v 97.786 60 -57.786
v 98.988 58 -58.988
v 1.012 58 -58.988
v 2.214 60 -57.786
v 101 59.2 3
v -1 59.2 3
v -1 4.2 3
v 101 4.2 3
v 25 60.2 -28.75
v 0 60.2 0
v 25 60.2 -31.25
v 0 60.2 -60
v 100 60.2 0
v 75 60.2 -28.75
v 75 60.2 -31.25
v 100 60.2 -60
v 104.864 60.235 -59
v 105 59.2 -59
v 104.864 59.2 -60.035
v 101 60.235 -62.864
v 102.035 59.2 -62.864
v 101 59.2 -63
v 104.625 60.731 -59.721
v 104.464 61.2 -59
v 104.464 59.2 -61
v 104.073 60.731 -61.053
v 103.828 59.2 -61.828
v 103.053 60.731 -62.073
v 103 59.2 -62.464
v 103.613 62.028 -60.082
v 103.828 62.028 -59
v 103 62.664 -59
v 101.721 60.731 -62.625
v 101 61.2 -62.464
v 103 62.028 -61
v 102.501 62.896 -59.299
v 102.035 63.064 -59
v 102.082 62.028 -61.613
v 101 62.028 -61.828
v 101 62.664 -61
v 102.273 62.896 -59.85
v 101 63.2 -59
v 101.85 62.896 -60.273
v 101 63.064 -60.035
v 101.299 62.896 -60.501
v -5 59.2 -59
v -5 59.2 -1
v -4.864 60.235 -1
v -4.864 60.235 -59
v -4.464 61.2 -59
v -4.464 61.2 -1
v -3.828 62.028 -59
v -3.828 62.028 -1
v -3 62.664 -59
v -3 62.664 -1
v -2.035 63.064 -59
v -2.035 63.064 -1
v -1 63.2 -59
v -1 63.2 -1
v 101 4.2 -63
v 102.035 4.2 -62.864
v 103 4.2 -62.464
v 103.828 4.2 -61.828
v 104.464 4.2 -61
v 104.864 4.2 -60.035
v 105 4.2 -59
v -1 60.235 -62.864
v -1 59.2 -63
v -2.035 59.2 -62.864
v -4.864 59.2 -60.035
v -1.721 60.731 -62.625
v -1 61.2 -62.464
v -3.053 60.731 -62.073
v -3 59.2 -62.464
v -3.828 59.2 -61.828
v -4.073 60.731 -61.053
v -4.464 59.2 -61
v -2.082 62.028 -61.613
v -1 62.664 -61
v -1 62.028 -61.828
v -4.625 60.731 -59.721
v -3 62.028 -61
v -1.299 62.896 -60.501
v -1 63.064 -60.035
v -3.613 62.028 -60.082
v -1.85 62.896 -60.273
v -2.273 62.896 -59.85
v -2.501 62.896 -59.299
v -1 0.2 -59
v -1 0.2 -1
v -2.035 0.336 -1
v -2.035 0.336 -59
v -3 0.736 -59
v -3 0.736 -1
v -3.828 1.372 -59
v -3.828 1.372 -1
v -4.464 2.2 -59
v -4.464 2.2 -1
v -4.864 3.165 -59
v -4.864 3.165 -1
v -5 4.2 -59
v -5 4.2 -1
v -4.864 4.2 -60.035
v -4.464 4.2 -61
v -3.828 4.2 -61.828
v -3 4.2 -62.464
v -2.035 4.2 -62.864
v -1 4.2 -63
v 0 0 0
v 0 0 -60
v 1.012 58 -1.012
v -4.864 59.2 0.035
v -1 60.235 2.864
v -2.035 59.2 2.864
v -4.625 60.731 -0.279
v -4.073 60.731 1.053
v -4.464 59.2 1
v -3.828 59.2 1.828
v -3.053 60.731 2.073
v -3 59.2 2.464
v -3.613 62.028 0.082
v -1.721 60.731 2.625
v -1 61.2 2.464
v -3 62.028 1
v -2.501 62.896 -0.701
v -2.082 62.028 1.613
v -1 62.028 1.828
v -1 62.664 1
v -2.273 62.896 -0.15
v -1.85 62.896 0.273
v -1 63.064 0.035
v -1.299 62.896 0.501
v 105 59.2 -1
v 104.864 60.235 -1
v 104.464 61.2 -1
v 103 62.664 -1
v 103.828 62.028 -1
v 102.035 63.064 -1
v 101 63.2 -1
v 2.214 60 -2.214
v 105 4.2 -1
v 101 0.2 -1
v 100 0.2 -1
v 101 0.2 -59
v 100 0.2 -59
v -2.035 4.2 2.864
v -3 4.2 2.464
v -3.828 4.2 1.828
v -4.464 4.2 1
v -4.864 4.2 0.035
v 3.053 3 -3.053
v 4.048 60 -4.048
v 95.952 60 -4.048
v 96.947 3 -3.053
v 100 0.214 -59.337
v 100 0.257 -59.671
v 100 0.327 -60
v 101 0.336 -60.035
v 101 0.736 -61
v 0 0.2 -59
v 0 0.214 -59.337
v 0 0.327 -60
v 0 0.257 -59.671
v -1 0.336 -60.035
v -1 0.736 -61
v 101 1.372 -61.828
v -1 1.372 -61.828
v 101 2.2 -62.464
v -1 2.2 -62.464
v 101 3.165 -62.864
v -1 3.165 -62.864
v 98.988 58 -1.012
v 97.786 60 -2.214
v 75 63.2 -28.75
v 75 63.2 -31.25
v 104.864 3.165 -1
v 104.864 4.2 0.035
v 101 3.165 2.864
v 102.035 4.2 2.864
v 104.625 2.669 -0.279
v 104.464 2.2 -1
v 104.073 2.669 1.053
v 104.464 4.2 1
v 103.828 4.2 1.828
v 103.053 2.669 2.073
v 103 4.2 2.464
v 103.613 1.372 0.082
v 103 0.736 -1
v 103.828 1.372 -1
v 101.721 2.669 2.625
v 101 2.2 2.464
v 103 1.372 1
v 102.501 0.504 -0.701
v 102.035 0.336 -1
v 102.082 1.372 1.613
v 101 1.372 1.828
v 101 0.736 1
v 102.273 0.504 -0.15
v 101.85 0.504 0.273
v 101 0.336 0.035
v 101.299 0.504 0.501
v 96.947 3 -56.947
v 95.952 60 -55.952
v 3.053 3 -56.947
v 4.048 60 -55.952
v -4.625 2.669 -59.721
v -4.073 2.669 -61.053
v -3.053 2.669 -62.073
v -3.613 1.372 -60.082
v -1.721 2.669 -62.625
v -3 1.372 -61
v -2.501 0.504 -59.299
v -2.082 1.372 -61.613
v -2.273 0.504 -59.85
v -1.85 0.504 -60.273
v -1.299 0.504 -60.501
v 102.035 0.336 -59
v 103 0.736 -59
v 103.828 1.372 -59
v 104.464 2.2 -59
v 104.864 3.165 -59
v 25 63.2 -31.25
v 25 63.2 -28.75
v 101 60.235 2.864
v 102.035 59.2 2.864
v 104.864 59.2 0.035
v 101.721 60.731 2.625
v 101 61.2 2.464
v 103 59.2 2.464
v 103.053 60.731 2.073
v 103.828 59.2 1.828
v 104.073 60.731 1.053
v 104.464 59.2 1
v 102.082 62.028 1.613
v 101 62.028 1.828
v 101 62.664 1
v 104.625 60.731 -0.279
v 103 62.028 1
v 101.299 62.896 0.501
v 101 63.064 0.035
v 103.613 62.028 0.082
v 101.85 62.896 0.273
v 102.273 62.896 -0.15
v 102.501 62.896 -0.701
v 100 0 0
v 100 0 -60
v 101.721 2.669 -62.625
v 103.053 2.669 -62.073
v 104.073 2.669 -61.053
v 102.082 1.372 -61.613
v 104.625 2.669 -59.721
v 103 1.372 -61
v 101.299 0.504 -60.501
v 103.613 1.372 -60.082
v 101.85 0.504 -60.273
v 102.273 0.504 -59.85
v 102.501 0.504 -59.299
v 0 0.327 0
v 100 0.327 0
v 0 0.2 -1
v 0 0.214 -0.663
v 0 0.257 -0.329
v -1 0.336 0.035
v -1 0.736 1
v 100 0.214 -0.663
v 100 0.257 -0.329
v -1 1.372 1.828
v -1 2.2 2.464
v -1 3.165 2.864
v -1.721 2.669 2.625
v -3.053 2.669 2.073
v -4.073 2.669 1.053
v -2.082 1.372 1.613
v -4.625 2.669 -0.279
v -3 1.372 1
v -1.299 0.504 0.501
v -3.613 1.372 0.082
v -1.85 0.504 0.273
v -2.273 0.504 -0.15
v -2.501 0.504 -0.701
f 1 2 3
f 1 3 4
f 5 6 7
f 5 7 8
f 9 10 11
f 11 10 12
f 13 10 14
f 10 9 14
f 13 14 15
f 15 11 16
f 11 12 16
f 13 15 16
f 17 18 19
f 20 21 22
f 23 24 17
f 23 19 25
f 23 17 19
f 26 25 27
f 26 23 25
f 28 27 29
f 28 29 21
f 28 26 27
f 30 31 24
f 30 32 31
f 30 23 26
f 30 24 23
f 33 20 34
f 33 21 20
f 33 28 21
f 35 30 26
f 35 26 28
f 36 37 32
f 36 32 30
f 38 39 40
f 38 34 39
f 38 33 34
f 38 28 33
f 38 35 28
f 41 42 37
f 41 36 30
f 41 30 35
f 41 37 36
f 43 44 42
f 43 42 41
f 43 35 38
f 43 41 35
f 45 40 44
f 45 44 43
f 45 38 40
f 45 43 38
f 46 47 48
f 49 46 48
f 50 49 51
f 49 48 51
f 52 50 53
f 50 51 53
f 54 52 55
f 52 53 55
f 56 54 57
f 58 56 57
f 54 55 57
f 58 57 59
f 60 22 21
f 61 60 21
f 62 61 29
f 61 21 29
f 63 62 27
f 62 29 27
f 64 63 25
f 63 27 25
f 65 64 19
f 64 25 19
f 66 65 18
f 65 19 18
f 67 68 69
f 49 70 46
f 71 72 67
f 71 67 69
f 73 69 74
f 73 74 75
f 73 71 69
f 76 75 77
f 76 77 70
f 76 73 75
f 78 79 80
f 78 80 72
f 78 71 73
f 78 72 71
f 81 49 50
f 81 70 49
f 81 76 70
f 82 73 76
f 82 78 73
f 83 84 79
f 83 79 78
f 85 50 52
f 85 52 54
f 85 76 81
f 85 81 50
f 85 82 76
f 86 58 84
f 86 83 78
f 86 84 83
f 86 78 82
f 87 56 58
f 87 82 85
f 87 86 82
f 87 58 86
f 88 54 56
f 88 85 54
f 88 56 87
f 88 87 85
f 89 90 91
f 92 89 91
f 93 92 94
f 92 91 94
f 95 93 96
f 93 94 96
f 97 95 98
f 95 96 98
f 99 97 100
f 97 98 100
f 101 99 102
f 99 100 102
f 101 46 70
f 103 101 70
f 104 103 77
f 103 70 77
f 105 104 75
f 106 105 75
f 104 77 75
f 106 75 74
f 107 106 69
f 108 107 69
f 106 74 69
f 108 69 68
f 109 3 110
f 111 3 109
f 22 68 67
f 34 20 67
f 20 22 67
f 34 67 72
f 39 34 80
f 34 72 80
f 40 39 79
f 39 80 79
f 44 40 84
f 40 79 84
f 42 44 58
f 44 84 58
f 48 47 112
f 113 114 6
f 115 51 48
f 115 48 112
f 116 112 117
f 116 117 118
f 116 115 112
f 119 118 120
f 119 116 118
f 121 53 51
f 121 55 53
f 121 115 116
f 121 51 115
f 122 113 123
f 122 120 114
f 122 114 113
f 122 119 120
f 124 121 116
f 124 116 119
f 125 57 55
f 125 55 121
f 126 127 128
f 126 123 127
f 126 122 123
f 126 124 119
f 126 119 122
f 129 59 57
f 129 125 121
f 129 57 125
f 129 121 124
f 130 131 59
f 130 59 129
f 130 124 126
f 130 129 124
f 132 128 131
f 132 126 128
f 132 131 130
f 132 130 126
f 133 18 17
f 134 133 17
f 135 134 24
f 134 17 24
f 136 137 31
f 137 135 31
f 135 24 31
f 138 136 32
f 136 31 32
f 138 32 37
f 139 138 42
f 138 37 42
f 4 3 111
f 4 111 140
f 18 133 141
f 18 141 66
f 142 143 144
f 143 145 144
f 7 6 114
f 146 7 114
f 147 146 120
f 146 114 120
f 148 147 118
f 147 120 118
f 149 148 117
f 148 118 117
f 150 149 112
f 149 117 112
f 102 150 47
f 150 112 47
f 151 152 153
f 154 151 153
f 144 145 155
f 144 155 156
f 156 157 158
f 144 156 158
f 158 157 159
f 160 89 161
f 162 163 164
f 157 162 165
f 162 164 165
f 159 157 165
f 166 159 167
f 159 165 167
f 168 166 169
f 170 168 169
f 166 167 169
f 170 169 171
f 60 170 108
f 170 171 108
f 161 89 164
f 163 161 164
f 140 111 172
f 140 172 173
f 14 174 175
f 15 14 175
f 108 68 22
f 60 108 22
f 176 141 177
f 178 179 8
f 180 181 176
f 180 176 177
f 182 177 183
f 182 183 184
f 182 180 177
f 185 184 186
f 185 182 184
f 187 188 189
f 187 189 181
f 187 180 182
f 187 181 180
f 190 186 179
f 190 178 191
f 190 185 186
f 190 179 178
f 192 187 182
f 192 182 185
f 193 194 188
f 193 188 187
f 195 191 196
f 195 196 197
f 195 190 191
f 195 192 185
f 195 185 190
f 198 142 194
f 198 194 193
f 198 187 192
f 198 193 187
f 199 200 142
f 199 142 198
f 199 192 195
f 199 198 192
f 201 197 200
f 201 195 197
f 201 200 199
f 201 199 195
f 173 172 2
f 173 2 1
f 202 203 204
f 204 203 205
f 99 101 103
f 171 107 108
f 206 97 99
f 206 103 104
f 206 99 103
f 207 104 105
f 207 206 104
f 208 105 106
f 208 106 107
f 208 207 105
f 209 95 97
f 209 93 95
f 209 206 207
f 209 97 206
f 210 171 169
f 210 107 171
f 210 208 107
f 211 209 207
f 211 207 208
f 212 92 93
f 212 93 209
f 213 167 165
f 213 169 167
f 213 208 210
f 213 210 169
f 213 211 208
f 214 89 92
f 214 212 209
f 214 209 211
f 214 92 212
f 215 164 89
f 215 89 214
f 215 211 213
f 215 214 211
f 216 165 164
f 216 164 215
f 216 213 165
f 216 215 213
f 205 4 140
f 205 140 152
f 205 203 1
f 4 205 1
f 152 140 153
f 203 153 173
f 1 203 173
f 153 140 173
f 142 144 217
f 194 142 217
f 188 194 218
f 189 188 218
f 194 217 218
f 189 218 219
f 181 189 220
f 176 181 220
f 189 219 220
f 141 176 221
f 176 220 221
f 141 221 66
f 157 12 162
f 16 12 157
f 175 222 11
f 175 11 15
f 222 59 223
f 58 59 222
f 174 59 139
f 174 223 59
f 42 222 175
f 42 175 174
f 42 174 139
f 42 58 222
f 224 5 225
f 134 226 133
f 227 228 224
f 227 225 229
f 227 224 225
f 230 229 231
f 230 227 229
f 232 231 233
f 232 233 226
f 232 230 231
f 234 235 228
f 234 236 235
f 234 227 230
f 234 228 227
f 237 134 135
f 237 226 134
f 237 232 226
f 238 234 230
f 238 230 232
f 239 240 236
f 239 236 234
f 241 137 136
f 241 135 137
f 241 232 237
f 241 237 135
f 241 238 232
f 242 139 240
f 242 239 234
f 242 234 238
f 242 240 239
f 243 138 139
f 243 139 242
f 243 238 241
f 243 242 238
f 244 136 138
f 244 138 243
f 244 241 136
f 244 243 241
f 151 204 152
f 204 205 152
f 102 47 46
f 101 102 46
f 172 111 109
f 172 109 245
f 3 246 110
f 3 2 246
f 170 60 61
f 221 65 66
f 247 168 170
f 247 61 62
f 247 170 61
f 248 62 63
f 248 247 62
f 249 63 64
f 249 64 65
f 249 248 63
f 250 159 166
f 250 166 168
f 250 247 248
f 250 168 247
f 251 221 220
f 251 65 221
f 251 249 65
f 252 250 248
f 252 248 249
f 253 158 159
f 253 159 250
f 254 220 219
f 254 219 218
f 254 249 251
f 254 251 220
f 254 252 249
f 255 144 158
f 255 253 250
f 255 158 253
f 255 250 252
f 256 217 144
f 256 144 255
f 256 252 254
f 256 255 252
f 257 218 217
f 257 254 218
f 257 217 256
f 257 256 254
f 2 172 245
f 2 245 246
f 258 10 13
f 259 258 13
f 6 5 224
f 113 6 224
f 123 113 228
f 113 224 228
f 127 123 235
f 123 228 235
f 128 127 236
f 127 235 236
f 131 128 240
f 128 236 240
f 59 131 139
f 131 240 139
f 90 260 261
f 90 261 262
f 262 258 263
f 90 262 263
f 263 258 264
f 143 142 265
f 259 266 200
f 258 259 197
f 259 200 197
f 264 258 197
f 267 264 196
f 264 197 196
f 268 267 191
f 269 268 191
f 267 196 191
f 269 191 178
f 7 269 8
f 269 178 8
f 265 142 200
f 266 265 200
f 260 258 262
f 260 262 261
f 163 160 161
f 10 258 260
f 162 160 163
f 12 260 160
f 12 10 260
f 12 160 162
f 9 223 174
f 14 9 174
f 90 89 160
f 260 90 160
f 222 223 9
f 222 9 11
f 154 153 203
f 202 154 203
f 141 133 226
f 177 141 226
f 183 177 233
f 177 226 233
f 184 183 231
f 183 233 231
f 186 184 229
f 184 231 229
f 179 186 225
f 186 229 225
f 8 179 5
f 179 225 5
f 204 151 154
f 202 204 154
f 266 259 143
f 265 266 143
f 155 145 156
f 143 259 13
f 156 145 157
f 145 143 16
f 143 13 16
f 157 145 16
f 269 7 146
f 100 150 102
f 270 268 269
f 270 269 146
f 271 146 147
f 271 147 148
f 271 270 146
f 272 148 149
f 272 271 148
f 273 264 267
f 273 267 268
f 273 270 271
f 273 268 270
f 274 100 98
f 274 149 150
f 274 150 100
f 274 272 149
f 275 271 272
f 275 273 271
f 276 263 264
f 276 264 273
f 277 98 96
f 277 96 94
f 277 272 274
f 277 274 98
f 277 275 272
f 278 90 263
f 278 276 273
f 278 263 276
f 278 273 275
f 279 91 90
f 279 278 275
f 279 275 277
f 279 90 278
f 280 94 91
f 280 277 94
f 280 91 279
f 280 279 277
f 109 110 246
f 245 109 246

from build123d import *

# Parameters (mm, degrees)
SKETCH1_W           = 100
SKETCH1_H           = 60
BOSS_EXTRUDE1_DEPTH = 60
BOSS_EXTRUDE1_TAPER = 1
SHELL1_T            = -3
CHAMFER1_SIZE       = 2
CHAMFER1_SIZE_2     = 1.166633397
SKETCH2_W           = 100
SKETCH2_H           = 60
BOSS_EXTRUDE2_DEPTH = 3
SKETCH3_W           = 110
SKETCH3_H           = 66
SKETCH3_W_2         = 100
SKETCH3_H_2         = 60
BOSS_EXTRUDE3_DEPTH = 63
SKETCH4_W           = 50
SKETCH4_H           = 2.5
CUT_EXTRUDE1_DEPTH  = 3
FILLET1_R           = 4


with BuildPart() as part:
    # Sketch1 → Boss-Extrude1 (new body)
    with BuildSketch(Plane(origin=(0, 0, 0), x_dir=(1, 0, 0), z_dir=(0, 1, 0))):
        with Locations((50, 30)):
            Rectangle(SKETCH1_W, SKETCH1_H)
    extrude(amount=BOSS_EXTRUDE1_DEPTH, taper=BOSS_EXTRUDE1_TAPER)

    # Shell1
    shell1_openings = [part.faces().sort_by_distance(p)[0] for p in [
        (50, 60, -30),
    ]]
    offset(amount=SHELL1_T, openings=shell1_openings, kind=Kind.INTERSECTION)

    # Chamfer1
    # the kernel refuses this chamfer: 2, 1.166633397 mm, written as the material it takes off along each edge
    with BuildSketch(Plane(origin=(98.952696104, 60, 4.126867614), x_dir=(0.03677296874035604, -0.9993236456574119, 0), z_dir=(0, 0, -1)), Plane(origin=(1.047303896, 60, -64.126867614), x_dir=(-0.036772968740354815, -0.9993236456574122, 0), z_dir=(0, 0, 1))) as chamfer1_piece_1:
        Polygon((CHAMFER1_SIZE * 0.999813220622, CHAMFER1_SIZE * 0.0193267656127), (-CHAMFER1_SIZE_2 * 0.0367729687471, CHAMFER1_SIZE_2 * 0.999323645842), (0, 0), align=None)
    extrude(amount=68.253735227, mode=Mode.SUBTRACT)
    with BuildSketch(Plane(origin=(104.126867614, 60, -58.952696104), x_dir=(0, -0.9993236456574122, -0.036772968740352616), z_dir=(-1, 0, 0)), Plane(origin=(-4.126867614, 60, -1.047303896), x_dir=(0, -0.9993236456574119, 0.03677296874035481), z_dir=(1, 0, 0))) as chamfer1_piece_2:
        Polygon((CHAMFER1_SIZE * 0.999813220622, CHAMFER1_SIZE * 0.0193267656127), (-CHAMFER1_SIZE_2 * 0.0367729687471, CHAMFER1_SIZE_2 * 0.999323645842), (0, 0), align=None)
    extrude(amount=108.253735227, mode=Mode.SUBTRACT)


with BuildPart() as body_2:
    # Sketch2 → Boss-Extrude2 (new body)
    with BuildSketch(Plane(origin=(0, 60.2, 0), x_dir=(1, 0, 0), z_dir=(0, 1, 0))):
        with Locations((50, 30)):
            Rectangle(SKETCH2_W, SKETCH2_H)
    extrude(amount=BOSS_EXTRUDE2_DEPTH)


with BuildPart() as body_3:
    # Sketch3 → Boss-Extrude3 (new body)
    with BuildSketch(Plane(origin=(0, 63.2, 0), x_dir=(1, 0, 0), z_dir=(0, 1, 0))):
        with Locations((50, 30)):
            Rectangle(SKETCH3_W, SKETCH3_H)
        with Locations((50, 30)):
            Rectangle(SKETCH3_W_2, SKETCH3_H_2, mode=Mode.SUBTRACT)
    extrude(amount=-BOSS_EXTRUDE3_DEPTH)


with BuildPart() as body_2_1:
    add(body_2.part)

    # Combine1: union body 3
    add(body_3.part)

    # Sketch4 → Cut-Extrude1 (cut)
    with BuildSketch(Plane(origin=(0, 63.2, 0), x_dir=(1, 0, 0), z_dir=(0, 1, 0))):
        with Locations((50, 30)):
            Rectangle(SKETCH4_W, SKETCH4_H)
    extrude(amount=-CUT_EXTRUDE1_DEPTH, mode=Mode.SUBTRACT)

    # Fillet1
    # the kernel refuses this fillet: 4 mm, written as the material it takes off along each edge
    with BuildSketch(Plane(origin=(101, 4.2, -59), x_dir=(0, 0, -1), z_dir=(0, -1, 0))) as fillet1_piece_1_section:
        Polygon((0, 0), (FILLET1_R, 0), (FILLET1_R, FILLET1_R), (0, FILLET1_R), align=None)
    fillet1_piece_1 = extrude(amount=FILLET1_R, mode=Mode.PRIVATE)
    fillet1_piece_1 = fillet1_piece_1 - Plane(origin=(101, 4.2, -59), x_dir=(-0.7071067811865475, 0, 0.7071067811865475), z_dir=(0, -1, 0)) * Sphere(FILLET1_R, mode=Mode.PRIVATE)
    add(fillet1_piece_1, mode=Mode.SUBTRACT)
    with BuildSketch(Plane(origin=(101, 4.2, -1), x_dir=(1, 0, 0), z_dir=(0, -1, 0))) as fillet1_piece_2_section:
        Polygon((0, 0), (FILLET1_R, 0), (FILLET1_R, FILLET1_R), (0, FILLET1_R), align=None)
    fillet1_piece_2 = extrude(amount=FILLET1_R, mode=Mode.PRIVATE)
    fillet1_piece_2 = fillet1_piece_2 - Plane(origin=(101, 4.2, -1), x_dir=(-0.7071067811865475, 0, -0.7071067811865475), z_dir=(0, -1, 0)) * Sphere(FILLET1_R, mode=Mode.PRIVATE)
    add(fillet1_piece_2, mode=Mode.SUBTRACT)
    with BuildSketch(Plane(origin=(101, 59.2, -59), x_dir=(0, 0, -1), z_dir=(0, 1, 0))) as fillet1_piece_3_section:
        Polygon((0, 0), (FILLET1_R, 0), (FILLET1_R, -FILLET1_R), (0, -FILLET1_R), align=None)
    fillet1_piece_3 = extrude(amount=FILLET1_R, mode=Mode.PRIVATE)
    fillet1_piece_3 = fillet1_piece_3 - Plane(origin=(101, 59.2, -59), x_dir=(-0.7071067811865475, 0, 0.7071067811865475), z_dir=(0, 1, 0)) * Sphere(FILLET1_R, mode=Mode.PRIVATE)
    add(fillet1_piece_3, mode=Mode.SUBTRACT)
    with BuildSketch(Plane(origin=(101, 59.2, -1), x_dir=(1, 0, 0), z_dir=(0, 1, 0))) as fillet1_piece_4_section:
        Polygon((0, 0), (FILLET1_R, 0), (FILLET1_R, -FILLET1_R), (0, -FILLET1_R), align=None)
    fillet1_piece_4 = extrude(amount=FILLET1_R, mode=Mode.PRIVATE)
    fillet1_piece_4 = fillet1_piece_4 - Plane(origin=(101, 59.2, -1), x_dir=(-0.7071067811865475, 0, -0.7071067811865475), z_dir=(0, 1, 0)) * Sphere(FILLET1_R, mode=Mode.PRIVATE)
    add(fillet1_piece_4, mode=Mode.SUBTRACT)
    with BuildSketch(Plane(origin=(-1, 4.2, -1), x_dir=(0, 0, 1), z_dir=(0, -1, 0))) as fillet1_piece_5_section:
        Polygon((0, 0), (FILLET1_R, 0), (FILLET1_R, FILLET1_R), (0, FILLET1_R), align=None)
    fillet1_piece_5 = extrude(amount=FILLET1_R, mode=Mode.PRIVATE)
    fillet1_piece_5 = fillet1_piece_5 - Plane(origin=(-1, 4.2, -1), x_dir=(0.7071067811865475, 0, -0.7071067811865475), z_dir=(0, -1, 0)) * Sphere(FILLET1_R, mode=Mode.PRIVATE)
    add(fillet1_piece_5, mode=Mode.SUBTRACT)
    with BuildSketch(Plane(origin=(-1, 59.2, -1), x_dir=(0, 0, 1), z_dir=(0, 1, 0))) as fillet1_piece_6_section:
        Polygon((0, 0), (FILLET1_R, 0), (FILLET1_R, -FILLET1_R), (0, -FILLET1_R), align=None)
    fillet1_piece_6 = extrude(amount=FILLET1_R, mode=Mode.PRIVATE)
    fillet1_piece_6 = fillet1_piece_6 - Plane(origin=(-1, 59.2, -1), x_dir=(0.7071067811865475, 0, -0.7071067811865475), z_dir=(0, 1, 0)) * Sphere(FILLET1_R, mode=Mode.PRIVATE)
    add(fillet1_piece_6, mode=Mode.SUBTRACT)
    with BuildSketch(Plane(origin=(-1, 4.2, -59), x_dir=(0, 0, -1), z_dir=(0, -1, 0))) as fillet1_piece_7_section:
        Polygon((0, 0), (FILLET1_R, 0), (FILLET1_R, -FILLET1_R), (0, -FILLET1_R), align=None)
    fillet1_piece_7 = extrude(amount=FILLET1_R, mode=Mode.PRIVATE)
    fillet1_piece_7 = fillet1_piece_7 - Plane(origin=(-1, 4.2, -59), x_dir=(0.7071067811865475, 0, 0.7071067811865475), z_dir=(0, -1, 0)) * Sphere(FILLET1_R, mode=Mode.PRIVATE)
    add(fillet1_piece_7, mode=Mode.SUBTRACT)
    with BuildSketch(Plane(origin=(-1, 59.2, -59), x_dir=(0, 0, -1), z_dir=(0, 1, 0))) as fillet1_piece_8_section:
        Polygon((0, 0), (FILLET1_R, 0), (FILLET1_R, FILLET1_R), (0, FILLET1_R), align=None)
    fillet1_piece_8 = extrude(amount=FILLET1_R, mode=Mode.PRIVATE)
    fillet1_piece_8 = fillet1_piece_8 - Plane(origin=(-1, 59.2, -59), x_dir=(0.7071067811865475, 0, 0.7071067811865475), z_dir=(0, 1, 0)) * Sphere(FILLET1_R, mode=Mode.PRIVATE)
    add(fillet1_piece_8, mode=Mode.SUBTRACT)
    with BuildSketch(Plane(origin=(105, 0.2, -59), x_dir=(-1, 0, 0), z_dir=(0, 0, 1)), Plane(origin=(-5, 0.2, -1), x_dir=(1, 0, 0), z_dir=(0, 0, -1))) as fillet1_piece_9:
        with BuildLine():
            CenterArc((FILLET1_R, -FILLET1_R), FILLET1_R, 90, 90)
            Line((0, -FILLET1_R), (0, 0))
            Line((0, 0), (FILLET1_R, 0))
        make_face()
    extrude(amount=58, mode=Mode.SUBTRACT)
    with BuildSketch(Plane(origin=(105, 63.2, -59), x_dir=(-1, 0, 0), z_dir=(0, 0, 1)), Plane(origin=(-5, 63.2, -1), x_dir=(1, 0, 0), z_dir=(0, 0, -1))) as fillet1_piece_10:
        with BuildLine():
            CenterArc((FILLET1_R, FILLET1_R), FILLET1_R, 180, 90)
            Line((0, FILLET1_R), (0, 0))
            Line((0, 0), (FILLET1_R, 0))
        make_face()
    extrude(amount=58, mode=Mode.SUBTRACT)
    with BuildSketch(Plane(origin=(105, 59.2, 3), x_dir=(0, 0, -1), z_dir=(0, -1, 0)), Plane(origin=(105, 59.2, -63), x_dir=(-1, 0, 0), z_dir=(0, -1, 0)), Plane(origin=(-5, 59.2, 3), x_dir=(1, 0, 0), z_dir=(0, -1, 0))) as fillet1_piece_11:
        with BuildLine():
            CenterArc((FILLET1_R, -FILLET1_R), FILLET1_R, 90, 90)
            Line((0, -FILLET1_R), (0, 0))
            Line((0, 0), (FILLET1_R, 0))
        make_face()
    extrude(amount=55, mode=Mode.SUBTRACT)
    with BuildSketch(Plane(origin=(101, 0.2, 3), x_dir=(0, 0, -1), z_dir=(-1, 0, 0)), Plane(origin=(-1, 0.2, -63), x_dir=(0, 0, 1), z_dir=(1, 0, 0))) as fillet1_piece_12:
        with BuildLine():
            CenterArc((FILLET1_R, -FILLET1_R), FILLET1_R, 90, 90)
            Line((0, -FILLET1_R), (0, 0))
            Line((0, 0), (FILLET1_R, 0))
        make_face()
    extrude(amount=102, mode=Mode.SUBTRACT)
    with BuildSketch(Plane(origin=(101, 63.2, 3), x_dir=(0, 0, -1), z_dir=(-1, 0, 0)), Plane(origin=(-1, 63.2, -63), x_dir=(0, 0, 1), z_dir=(1, 0, 0))) as fillet1_piece_13:
        with BuildLine():
            CenterArc((FILLET1_R, FILLET1_R), FILLET1_R, 180, 90)
            Line((0, FILLET1_R), (0, 0))
            Line((0, 0), (FILLET1_R, 0))
        make_face()
    extrude(amount=102, mode=Mode.SUBTRACT)
    with BuildSketch(Plane(origin=(-5, 59.2, -63), x_dir=(1, 0, 0), z_dir=(0, -1, 0))) as fillet1_piece_14:
        with BuildLine():
            CenterArc((FILLET1_R, FILLET1_R), FILLET1_R, 180, 90)
            Line((0, FILLET1_R), (0, 0))
            Line((0, 0), (FILLET1_R, 0))
        make_face()
    extrude(amount=55, mode=Mode.SUBTRACT)


solid = Compound([part.part, body_2_1.part])
